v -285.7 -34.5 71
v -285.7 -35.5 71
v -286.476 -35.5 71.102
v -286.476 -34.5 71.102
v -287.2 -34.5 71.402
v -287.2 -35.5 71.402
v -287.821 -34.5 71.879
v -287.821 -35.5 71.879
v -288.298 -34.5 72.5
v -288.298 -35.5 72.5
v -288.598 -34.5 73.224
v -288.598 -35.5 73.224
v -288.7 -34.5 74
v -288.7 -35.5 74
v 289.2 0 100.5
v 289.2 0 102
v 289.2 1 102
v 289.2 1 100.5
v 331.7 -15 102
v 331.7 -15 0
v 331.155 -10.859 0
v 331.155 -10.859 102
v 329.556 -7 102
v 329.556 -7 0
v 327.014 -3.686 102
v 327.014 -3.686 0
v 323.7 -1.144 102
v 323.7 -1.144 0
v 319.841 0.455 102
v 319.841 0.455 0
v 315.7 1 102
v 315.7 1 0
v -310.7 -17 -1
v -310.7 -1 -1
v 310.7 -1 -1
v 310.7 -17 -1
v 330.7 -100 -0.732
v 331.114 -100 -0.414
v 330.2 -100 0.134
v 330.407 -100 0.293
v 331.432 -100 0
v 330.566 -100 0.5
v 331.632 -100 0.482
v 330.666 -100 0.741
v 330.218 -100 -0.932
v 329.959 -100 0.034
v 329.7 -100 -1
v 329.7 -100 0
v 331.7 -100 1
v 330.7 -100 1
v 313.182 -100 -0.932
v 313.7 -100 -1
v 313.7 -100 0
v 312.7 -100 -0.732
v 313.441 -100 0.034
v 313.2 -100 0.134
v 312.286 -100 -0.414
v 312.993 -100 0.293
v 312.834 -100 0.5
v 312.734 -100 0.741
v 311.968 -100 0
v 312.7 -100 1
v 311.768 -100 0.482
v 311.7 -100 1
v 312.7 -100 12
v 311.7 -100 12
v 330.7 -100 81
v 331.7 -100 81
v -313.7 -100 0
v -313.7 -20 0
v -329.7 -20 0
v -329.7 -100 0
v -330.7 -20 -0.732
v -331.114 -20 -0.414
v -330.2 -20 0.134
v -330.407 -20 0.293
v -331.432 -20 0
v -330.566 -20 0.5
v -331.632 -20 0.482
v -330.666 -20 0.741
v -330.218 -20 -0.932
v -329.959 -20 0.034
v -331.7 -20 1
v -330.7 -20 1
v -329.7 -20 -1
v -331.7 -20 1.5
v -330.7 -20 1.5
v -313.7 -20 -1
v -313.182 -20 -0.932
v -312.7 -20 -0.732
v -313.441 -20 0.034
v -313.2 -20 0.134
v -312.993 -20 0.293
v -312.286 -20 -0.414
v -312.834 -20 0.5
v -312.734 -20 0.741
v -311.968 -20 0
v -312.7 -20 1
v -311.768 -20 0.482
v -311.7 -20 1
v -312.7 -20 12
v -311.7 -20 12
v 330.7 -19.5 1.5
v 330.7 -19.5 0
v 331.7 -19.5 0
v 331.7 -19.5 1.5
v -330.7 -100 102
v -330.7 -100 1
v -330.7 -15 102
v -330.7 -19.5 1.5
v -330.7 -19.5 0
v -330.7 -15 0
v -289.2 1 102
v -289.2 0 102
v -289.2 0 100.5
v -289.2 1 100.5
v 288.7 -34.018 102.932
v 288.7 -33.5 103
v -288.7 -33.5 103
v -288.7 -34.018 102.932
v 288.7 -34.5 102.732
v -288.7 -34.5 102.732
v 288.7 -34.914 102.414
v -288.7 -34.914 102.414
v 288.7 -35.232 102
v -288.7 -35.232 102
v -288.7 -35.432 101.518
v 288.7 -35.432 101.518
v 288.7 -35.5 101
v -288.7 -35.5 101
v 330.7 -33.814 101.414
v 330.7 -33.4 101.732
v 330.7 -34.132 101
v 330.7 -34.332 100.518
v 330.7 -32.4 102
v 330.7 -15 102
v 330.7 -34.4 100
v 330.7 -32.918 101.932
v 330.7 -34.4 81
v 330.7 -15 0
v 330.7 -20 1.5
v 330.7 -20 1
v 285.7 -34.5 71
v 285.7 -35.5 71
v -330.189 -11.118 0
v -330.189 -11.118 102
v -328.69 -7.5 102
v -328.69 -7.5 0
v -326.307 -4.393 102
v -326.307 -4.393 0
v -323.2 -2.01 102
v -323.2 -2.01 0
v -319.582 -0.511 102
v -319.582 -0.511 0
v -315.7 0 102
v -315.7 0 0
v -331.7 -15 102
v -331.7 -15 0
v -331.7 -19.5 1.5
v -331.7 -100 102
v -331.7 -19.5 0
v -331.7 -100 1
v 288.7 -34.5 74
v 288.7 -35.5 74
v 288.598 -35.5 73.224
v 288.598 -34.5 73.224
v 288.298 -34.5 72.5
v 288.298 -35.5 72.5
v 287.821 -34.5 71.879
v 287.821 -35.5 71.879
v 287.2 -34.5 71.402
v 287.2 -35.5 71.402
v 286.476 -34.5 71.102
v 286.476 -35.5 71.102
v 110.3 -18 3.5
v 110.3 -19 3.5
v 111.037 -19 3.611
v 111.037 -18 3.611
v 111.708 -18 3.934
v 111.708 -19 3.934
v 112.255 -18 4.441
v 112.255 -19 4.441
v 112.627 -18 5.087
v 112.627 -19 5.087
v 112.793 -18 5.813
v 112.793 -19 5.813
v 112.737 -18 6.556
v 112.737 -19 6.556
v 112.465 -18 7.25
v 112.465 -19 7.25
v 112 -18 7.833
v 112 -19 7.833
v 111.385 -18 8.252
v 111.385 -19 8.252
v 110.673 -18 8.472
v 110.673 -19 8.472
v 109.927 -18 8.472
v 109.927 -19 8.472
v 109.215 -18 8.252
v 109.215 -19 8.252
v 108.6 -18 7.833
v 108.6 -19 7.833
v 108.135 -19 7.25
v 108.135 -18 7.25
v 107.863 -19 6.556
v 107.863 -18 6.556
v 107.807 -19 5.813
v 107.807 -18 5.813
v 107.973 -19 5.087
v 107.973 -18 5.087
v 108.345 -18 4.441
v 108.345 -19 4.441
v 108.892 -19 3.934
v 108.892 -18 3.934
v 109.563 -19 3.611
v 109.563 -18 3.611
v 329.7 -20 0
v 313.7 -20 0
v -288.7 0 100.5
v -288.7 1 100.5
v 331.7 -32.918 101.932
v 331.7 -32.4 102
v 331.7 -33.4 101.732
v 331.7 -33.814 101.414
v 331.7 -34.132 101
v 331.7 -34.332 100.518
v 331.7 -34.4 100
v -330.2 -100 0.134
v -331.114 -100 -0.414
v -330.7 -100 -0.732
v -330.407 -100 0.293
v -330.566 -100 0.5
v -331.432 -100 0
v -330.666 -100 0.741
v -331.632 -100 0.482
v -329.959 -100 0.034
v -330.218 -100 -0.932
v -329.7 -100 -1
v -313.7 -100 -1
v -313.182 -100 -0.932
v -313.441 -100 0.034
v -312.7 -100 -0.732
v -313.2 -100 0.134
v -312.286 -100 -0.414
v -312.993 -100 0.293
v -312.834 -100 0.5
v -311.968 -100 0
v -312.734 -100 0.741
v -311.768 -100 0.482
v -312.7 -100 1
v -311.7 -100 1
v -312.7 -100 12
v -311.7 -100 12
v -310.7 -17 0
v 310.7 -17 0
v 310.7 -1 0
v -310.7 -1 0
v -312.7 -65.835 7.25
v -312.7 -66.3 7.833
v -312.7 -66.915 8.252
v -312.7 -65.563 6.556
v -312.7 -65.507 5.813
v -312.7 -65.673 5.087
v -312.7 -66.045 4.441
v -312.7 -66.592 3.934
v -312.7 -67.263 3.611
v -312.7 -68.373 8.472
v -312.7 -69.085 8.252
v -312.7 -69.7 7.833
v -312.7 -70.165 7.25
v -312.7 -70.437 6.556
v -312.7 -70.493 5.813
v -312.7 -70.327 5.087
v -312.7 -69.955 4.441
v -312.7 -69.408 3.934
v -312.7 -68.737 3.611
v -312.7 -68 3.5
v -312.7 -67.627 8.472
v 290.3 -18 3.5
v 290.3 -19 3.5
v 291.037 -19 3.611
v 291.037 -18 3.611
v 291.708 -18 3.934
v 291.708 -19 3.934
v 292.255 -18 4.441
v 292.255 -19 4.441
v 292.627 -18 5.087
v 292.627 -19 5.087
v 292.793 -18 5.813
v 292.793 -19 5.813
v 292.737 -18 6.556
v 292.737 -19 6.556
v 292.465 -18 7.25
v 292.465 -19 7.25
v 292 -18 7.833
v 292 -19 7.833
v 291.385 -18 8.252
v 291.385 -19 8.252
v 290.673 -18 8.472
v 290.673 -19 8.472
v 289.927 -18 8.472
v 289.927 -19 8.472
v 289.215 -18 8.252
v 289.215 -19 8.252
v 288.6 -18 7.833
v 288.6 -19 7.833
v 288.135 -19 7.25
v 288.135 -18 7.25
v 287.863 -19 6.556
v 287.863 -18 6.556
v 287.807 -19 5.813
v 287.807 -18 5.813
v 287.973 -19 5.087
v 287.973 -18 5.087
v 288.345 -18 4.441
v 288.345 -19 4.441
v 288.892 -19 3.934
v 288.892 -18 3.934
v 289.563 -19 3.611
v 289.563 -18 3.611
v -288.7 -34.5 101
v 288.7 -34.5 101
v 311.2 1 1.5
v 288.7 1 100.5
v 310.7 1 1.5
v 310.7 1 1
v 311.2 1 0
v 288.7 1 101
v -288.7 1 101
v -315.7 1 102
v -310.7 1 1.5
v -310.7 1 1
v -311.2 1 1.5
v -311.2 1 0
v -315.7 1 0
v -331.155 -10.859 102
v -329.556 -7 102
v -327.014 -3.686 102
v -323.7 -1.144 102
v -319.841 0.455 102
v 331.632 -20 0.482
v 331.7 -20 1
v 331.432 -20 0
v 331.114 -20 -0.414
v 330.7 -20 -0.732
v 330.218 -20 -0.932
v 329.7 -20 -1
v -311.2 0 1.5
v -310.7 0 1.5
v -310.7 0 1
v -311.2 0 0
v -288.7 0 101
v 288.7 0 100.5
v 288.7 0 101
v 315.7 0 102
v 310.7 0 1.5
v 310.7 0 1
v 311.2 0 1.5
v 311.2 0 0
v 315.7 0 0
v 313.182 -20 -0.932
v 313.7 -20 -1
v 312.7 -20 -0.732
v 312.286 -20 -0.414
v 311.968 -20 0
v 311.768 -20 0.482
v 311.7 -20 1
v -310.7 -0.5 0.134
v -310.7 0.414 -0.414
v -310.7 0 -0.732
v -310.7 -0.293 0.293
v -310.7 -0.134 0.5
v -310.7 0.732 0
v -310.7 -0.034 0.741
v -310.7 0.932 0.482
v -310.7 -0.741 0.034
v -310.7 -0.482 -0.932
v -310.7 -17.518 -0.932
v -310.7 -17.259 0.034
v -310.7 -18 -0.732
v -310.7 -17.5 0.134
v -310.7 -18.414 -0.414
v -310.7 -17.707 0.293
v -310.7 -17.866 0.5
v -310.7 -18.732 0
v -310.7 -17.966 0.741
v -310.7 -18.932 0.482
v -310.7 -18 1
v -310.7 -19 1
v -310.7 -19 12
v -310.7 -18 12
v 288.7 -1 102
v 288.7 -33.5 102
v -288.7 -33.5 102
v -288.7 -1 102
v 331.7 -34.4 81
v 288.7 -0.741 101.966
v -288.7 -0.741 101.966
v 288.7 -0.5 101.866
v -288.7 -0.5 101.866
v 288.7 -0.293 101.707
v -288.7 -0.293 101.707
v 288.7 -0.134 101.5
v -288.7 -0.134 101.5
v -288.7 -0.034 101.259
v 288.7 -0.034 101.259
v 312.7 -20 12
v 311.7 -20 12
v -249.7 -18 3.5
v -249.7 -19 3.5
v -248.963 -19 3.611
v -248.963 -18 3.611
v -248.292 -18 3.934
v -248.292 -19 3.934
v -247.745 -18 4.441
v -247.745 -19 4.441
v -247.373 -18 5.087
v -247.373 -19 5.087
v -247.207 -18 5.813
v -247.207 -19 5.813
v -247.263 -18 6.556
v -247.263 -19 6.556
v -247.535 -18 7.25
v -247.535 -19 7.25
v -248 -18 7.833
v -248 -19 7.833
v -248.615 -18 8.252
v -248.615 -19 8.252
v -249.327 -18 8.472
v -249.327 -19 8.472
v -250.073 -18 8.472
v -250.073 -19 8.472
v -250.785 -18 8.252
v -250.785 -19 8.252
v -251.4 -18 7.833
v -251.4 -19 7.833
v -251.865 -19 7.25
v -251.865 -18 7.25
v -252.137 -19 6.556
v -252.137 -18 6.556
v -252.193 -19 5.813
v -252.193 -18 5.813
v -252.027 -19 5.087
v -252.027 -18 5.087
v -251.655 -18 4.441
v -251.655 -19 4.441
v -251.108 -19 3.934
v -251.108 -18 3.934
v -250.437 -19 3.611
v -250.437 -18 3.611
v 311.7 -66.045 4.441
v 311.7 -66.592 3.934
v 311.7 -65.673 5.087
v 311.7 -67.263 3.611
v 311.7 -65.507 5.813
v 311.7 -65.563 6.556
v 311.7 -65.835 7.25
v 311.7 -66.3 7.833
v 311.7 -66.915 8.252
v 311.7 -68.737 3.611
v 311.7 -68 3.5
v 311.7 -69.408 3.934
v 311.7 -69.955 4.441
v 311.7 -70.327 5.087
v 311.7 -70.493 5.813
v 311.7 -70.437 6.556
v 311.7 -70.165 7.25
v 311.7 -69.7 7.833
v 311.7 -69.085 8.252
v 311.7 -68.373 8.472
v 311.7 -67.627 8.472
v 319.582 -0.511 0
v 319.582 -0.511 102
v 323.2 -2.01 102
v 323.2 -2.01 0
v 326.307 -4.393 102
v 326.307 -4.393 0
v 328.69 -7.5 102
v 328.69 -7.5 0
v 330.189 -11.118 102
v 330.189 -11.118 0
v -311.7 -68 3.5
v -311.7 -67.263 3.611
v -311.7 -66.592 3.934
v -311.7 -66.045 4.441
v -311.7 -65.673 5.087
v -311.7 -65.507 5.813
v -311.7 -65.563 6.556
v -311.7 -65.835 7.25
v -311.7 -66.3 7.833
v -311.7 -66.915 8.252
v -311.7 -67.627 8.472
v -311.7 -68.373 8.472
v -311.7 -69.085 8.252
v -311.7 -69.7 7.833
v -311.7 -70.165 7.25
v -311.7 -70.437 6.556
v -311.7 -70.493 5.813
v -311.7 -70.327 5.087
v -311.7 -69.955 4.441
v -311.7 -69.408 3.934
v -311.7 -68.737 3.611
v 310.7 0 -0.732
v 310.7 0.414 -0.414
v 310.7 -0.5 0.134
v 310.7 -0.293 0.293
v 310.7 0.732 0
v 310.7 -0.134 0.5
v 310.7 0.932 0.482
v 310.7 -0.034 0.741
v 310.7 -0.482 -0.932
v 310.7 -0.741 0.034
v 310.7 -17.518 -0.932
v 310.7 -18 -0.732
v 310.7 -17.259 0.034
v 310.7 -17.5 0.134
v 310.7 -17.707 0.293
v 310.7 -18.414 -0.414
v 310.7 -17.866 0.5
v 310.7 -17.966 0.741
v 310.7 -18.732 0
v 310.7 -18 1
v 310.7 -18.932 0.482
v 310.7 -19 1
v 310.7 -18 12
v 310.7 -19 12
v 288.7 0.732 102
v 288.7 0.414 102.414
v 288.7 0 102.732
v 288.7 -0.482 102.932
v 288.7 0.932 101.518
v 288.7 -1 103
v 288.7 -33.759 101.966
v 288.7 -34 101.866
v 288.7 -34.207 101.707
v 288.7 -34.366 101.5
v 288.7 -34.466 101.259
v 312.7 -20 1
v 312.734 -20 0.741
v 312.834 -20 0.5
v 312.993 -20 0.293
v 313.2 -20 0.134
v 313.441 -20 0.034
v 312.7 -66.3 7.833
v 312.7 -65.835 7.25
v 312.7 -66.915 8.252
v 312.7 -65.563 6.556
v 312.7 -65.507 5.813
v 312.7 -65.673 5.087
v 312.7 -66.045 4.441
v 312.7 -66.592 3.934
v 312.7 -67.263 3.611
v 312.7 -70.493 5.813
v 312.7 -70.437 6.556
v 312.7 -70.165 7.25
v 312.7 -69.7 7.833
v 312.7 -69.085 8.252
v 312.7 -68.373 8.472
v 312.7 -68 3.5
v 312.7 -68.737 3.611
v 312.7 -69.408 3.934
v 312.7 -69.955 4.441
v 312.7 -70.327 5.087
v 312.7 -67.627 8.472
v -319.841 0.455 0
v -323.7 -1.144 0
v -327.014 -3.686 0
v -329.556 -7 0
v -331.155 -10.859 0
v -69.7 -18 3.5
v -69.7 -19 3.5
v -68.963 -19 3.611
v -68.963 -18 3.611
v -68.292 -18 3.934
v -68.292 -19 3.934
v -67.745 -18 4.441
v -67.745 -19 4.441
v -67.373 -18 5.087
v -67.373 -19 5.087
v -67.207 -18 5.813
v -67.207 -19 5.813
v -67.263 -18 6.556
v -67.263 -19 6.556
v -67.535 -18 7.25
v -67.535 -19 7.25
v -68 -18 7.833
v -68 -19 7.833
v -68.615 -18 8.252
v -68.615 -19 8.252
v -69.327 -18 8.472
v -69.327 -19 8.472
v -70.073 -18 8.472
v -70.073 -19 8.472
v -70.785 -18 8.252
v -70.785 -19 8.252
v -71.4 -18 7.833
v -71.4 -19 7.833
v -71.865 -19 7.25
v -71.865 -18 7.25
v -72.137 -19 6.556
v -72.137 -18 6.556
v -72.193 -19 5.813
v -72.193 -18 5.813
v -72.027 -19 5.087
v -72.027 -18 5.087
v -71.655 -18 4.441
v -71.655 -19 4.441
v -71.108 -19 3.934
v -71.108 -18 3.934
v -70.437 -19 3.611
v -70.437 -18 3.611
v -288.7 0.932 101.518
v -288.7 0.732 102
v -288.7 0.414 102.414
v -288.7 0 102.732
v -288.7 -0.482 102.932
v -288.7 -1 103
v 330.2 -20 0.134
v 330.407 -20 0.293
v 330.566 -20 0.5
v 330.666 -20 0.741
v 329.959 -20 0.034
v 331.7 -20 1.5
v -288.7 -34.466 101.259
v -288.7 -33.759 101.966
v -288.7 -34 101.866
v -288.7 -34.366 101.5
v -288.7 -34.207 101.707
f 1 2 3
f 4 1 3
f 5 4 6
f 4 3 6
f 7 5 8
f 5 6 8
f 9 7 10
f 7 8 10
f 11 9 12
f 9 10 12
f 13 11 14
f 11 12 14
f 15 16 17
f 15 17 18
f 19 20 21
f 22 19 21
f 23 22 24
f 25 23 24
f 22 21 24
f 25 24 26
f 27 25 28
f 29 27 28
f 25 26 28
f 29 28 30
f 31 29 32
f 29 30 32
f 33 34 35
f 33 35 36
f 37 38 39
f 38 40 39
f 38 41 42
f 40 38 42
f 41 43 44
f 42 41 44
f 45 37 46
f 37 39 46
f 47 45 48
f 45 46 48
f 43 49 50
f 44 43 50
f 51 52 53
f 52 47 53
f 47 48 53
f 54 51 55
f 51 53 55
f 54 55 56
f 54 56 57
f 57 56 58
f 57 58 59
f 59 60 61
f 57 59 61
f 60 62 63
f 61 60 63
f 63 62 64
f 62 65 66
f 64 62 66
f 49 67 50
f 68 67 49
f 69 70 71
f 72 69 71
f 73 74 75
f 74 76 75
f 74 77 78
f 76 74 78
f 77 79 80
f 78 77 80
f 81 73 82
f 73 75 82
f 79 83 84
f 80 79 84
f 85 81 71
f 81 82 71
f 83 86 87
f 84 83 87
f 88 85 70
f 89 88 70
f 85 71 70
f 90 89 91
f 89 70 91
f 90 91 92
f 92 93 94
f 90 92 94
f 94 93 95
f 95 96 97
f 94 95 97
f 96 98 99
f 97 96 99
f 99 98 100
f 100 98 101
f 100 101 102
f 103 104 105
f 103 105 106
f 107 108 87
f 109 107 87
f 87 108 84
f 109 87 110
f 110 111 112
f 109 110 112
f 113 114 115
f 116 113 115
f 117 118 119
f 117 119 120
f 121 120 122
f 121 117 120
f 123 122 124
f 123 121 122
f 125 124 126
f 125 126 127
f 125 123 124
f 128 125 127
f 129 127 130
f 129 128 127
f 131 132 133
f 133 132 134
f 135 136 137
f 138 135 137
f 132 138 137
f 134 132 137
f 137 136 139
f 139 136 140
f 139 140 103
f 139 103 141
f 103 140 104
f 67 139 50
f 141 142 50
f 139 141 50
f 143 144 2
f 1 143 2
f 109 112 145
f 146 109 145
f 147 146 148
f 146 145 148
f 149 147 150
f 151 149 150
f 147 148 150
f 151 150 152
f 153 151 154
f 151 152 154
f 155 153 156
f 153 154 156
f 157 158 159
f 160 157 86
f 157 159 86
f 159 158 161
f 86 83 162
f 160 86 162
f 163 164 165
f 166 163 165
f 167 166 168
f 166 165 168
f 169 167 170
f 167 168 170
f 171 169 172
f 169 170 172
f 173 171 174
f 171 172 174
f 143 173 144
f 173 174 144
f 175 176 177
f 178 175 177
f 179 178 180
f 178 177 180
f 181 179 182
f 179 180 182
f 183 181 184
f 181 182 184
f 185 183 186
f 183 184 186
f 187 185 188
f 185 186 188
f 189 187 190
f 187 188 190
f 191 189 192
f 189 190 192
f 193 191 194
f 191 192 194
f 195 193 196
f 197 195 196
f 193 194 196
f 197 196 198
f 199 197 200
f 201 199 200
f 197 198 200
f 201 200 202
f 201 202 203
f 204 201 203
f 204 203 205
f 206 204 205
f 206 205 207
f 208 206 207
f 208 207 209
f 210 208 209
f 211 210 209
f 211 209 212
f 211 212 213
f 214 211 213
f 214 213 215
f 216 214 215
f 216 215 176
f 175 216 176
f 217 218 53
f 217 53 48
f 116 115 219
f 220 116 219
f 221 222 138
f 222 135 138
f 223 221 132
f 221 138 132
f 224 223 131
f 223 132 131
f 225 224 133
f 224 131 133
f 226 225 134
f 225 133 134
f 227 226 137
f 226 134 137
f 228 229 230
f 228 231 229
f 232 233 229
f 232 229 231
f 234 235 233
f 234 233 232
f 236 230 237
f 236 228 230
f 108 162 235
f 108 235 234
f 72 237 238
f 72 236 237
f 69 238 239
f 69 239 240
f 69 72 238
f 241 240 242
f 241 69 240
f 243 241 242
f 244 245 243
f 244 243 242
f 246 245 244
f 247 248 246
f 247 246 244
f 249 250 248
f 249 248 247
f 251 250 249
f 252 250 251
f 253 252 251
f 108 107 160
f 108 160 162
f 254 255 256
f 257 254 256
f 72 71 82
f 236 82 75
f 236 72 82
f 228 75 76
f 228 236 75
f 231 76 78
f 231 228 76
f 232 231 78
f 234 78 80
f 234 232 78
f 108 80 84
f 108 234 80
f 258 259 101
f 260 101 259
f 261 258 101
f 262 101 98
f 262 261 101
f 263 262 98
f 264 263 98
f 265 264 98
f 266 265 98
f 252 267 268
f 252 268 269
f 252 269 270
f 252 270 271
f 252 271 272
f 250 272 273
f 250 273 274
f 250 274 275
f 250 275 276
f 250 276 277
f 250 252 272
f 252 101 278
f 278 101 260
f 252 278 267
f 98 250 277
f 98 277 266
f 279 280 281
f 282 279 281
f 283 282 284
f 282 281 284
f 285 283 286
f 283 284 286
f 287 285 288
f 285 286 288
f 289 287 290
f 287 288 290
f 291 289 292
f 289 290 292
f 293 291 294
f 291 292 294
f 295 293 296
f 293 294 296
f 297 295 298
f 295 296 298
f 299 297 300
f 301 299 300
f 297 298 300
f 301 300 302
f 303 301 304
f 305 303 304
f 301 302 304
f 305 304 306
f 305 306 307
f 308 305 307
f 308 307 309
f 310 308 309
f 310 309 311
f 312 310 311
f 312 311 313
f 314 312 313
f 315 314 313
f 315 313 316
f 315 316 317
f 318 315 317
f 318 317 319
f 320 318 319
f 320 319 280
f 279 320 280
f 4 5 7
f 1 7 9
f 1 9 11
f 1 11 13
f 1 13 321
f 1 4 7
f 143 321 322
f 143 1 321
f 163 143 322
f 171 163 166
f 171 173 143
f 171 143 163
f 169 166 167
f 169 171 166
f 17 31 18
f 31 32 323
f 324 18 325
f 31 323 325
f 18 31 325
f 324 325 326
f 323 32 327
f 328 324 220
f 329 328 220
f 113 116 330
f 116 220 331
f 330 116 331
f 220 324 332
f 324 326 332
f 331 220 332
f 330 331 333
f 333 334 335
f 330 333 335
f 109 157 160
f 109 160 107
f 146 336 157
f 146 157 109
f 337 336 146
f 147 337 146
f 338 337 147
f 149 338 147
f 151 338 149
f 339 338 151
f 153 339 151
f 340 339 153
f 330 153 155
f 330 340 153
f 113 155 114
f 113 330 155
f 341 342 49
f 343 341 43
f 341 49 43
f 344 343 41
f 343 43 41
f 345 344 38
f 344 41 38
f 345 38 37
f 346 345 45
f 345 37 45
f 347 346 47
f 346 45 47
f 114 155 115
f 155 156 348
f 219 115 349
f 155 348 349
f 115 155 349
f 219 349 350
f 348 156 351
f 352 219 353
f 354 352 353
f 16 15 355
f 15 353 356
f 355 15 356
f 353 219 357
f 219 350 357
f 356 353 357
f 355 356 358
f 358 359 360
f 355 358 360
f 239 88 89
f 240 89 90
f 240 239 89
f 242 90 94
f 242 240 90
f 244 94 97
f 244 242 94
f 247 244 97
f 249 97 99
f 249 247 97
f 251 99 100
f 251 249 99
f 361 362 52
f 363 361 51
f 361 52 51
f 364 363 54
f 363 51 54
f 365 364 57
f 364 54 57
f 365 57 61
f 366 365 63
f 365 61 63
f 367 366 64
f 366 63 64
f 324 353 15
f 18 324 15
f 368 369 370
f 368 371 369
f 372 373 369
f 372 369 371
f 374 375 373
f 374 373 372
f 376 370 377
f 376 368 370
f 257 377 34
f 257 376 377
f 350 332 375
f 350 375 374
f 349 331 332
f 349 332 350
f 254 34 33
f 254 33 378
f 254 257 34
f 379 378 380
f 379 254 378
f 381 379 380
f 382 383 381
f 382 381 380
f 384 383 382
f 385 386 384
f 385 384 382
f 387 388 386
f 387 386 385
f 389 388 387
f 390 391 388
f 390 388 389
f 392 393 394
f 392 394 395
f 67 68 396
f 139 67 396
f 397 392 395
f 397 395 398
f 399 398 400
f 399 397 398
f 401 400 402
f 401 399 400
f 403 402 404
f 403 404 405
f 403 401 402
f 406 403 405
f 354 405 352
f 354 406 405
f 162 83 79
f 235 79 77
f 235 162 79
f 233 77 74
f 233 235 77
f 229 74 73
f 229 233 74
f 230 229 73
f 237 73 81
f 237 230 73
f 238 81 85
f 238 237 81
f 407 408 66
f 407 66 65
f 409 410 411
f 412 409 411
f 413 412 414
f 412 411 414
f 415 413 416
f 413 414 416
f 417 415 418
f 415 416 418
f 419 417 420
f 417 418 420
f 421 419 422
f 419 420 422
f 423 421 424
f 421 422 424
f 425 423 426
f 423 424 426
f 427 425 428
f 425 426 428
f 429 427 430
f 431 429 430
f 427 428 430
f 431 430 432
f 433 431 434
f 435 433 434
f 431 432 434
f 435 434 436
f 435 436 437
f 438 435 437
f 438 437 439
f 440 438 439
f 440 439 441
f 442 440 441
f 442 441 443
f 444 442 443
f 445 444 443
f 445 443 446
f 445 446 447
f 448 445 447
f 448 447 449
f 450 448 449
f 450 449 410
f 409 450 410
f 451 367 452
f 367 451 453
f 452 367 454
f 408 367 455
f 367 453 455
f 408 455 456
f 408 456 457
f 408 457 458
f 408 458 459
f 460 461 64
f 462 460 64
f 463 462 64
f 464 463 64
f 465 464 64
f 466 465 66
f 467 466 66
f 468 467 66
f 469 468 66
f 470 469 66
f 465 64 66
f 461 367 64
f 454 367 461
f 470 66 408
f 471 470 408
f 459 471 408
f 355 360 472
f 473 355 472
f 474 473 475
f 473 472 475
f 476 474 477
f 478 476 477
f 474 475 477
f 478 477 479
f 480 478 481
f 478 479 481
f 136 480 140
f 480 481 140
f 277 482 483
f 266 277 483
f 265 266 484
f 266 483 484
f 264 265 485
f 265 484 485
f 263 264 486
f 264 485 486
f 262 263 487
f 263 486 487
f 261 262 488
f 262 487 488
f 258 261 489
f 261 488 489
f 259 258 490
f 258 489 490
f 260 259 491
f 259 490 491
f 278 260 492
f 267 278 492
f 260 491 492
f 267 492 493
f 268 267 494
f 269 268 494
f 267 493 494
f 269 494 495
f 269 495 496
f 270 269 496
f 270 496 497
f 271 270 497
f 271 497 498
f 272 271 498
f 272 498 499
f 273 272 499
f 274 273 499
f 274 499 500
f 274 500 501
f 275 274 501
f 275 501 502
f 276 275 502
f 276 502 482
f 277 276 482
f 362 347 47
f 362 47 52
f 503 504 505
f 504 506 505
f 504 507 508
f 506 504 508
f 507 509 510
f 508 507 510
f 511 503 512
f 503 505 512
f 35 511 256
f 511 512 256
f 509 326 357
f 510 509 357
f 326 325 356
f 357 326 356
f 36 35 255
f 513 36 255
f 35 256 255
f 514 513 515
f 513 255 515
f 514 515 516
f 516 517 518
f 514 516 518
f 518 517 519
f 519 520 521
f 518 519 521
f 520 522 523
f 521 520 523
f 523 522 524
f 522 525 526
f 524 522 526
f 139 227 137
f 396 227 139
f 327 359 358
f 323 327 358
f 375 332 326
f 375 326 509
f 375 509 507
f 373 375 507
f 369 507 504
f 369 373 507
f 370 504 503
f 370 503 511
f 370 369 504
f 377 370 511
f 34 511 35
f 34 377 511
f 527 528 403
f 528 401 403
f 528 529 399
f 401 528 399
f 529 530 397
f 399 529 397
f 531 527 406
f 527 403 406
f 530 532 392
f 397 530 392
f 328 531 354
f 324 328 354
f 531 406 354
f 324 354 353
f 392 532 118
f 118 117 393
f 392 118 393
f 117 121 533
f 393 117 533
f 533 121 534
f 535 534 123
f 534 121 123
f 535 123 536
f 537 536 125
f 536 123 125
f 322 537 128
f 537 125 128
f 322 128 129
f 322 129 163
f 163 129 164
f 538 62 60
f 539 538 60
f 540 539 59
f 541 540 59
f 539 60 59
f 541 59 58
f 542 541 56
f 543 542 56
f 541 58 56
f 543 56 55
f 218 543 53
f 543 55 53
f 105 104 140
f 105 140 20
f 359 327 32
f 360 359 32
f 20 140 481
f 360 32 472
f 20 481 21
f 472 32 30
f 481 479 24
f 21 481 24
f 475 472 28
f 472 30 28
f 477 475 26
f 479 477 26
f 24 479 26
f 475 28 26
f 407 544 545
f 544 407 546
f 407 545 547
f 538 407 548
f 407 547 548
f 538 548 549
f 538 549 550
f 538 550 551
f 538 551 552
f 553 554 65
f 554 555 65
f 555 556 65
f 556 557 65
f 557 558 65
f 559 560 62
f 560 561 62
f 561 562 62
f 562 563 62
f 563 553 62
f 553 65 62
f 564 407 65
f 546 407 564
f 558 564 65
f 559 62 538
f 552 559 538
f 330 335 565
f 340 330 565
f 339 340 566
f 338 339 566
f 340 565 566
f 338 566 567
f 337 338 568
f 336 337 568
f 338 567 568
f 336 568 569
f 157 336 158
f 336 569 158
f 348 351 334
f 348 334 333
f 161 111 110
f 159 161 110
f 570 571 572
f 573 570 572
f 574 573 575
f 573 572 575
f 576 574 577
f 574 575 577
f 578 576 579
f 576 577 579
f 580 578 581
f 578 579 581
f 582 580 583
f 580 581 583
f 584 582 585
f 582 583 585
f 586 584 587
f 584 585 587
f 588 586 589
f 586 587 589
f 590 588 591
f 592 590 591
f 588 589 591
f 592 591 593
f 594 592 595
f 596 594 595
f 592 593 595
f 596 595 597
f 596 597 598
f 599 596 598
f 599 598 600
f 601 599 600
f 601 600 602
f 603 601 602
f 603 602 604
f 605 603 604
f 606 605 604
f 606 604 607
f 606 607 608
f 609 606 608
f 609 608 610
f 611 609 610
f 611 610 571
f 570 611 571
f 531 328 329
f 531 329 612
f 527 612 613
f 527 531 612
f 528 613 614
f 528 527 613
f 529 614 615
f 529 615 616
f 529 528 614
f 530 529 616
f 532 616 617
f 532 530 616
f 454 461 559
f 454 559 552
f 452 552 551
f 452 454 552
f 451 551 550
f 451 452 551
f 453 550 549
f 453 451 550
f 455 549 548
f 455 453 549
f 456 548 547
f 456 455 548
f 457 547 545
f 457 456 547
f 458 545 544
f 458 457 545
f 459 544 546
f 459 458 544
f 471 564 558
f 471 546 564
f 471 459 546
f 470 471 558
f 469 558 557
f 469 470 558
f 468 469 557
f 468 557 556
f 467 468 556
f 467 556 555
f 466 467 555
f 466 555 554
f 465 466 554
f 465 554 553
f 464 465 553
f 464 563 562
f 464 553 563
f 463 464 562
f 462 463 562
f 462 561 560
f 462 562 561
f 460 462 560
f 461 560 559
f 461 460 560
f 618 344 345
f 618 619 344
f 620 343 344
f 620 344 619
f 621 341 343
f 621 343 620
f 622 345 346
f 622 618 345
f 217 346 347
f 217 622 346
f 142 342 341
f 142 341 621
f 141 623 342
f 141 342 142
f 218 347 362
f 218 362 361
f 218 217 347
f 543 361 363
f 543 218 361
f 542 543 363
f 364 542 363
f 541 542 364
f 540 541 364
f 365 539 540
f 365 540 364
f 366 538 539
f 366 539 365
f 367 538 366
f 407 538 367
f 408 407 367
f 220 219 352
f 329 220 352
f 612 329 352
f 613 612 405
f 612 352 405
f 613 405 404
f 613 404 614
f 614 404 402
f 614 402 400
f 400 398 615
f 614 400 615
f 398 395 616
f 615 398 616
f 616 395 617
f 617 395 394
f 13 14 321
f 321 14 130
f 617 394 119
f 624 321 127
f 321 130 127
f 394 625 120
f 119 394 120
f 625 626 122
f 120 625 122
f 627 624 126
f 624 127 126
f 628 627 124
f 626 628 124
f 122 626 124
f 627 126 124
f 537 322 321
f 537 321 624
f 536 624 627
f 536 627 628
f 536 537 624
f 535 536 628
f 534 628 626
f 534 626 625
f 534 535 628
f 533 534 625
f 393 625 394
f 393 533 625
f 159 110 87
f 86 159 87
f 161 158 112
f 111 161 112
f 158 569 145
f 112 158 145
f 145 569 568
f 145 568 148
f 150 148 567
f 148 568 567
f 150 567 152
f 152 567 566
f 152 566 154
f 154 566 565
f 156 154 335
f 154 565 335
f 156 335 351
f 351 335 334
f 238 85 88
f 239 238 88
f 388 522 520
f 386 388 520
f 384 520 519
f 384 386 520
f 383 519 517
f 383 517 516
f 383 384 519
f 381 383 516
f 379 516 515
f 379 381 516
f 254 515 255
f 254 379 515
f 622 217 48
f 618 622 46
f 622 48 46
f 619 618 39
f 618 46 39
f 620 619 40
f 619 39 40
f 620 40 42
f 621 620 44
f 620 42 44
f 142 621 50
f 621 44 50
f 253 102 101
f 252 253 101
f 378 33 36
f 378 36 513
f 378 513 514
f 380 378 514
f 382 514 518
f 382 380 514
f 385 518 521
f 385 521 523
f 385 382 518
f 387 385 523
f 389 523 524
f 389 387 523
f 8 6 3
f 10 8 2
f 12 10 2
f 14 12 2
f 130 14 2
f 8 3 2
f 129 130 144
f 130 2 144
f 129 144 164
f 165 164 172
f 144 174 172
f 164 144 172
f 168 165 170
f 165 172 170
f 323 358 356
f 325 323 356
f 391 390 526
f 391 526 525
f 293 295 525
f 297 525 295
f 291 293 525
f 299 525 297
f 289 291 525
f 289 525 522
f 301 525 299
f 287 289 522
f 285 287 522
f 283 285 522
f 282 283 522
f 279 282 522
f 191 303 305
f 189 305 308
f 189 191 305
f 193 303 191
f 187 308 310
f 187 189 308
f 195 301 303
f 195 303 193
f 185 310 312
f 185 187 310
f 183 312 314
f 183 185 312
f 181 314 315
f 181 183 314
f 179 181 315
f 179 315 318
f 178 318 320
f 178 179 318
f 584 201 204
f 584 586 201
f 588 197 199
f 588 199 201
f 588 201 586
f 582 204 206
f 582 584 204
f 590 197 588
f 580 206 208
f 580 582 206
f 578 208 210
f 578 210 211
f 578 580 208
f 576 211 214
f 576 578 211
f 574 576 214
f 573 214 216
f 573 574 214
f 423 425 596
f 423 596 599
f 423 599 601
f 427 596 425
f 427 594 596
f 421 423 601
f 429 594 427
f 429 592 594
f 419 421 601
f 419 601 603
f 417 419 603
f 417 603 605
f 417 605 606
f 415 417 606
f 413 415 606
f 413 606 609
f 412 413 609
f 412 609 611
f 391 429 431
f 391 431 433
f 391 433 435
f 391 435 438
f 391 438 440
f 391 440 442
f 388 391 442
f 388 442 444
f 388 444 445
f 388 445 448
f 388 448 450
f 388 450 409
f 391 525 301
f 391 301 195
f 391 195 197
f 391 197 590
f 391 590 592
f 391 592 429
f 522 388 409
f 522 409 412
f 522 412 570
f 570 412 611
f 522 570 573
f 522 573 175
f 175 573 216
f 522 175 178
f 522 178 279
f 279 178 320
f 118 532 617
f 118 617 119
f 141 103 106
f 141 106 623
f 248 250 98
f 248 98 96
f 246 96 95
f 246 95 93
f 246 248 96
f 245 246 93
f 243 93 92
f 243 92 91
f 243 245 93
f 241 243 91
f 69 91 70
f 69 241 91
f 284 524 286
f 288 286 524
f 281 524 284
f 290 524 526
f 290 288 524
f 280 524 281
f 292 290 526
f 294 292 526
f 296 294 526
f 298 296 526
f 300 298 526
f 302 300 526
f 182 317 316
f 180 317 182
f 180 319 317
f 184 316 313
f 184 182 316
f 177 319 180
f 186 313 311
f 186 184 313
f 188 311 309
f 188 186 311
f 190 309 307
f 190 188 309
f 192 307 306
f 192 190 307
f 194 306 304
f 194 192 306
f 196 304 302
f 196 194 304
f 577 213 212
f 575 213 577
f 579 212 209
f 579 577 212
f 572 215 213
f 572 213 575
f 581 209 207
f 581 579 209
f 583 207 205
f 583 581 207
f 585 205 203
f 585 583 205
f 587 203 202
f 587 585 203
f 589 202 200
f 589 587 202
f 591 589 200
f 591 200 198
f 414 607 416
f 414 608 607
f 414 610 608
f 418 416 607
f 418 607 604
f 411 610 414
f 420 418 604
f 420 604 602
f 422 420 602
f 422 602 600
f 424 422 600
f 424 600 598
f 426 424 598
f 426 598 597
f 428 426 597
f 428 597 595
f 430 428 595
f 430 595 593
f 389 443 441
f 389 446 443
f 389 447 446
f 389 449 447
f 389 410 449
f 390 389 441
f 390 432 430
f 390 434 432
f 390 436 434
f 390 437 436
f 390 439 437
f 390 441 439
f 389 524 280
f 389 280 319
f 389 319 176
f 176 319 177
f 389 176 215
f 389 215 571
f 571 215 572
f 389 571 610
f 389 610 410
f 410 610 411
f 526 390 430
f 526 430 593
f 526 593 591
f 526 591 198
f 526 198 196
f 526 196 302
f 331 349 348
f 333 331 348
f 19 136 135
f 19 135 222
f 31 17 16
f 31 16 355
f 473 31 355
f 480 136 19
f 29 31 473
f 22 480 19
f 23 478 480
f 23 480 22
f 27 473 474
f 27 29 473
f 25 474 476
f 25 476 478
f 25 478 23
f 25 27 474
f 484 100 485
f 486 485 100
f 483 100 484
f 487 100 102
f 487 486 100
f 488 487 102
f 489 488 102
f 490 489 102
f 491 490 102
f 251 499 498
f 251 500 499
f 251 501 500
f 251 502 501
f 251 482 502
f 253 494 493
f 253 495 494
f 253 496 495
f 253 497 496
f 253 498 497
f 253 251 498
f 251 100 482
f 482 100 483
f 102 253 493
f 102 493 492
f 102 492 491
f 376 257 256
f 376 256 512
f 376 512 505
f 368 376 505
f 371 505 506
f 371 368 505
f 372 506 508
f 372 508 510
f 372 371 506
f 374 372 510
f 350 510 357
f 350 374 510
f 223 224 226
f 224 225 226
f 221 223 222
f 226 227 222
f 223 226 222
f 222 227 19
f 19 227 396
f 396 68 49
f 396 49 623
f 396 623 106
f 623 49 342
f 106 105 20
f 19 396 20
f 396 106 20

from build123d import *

# Parameters (mm, degrees)
BASE_FLANGE1_DEPTH             = 102
EDGE_FLANGE1_STRIP_W           = 6
EDGE_FLANGE1_STRIP_H           = 1
EDGE_FLANGE1_STRIP_CUT_DEPTH   = 621.4
EDGE_FLANGE1_RELIEF_W          = 6.5
EDGE_FLANGE1_RELIEF_H          = 0.5
EDGE_FLANGE1_RELIEF_CUT_DEPTH  = 1
EDGE_FLANGE1_DEPTH             = 621.4
EDGE_FLANGE2_STRIP_W           = 6
EDGE_FLANGE2_STRIP_H           = 1
EDGE_FLANGE2_STRIP_CUT_DEPTH   = 621.4
EDGE_FLANGE2_DEPTH             = 621.4
EDGE_FLANGE3_STRIP_W           = 6
EDGE_FLANGE3_STRIP_H           = 1
EDGE_FLANGE3_STRIP_CUT_DEPTH   = 80
EDGE_FLANGE3_RELIEF_W          = 6.5
EDGE_FLANGE3_RELIEF_H          = 0.5
EDGE_FLANGE3_RELIEF_CUT_DEPTH  = 1
EDGE_FLANGE3_DEPTH             = 80
EDGE_FLANGE4_STRIP_W           = 6
EDGE_FLANGE4_STRIP_H           = 1
EDGE_FLANGE4_STRIP_CUT_DEPTH   = 80
EDGE_FLANGE4_DEPTH             = 80
EDGE_FLANGE5_STRIP_W           = 6
EDGE_FLANGE5_STRIP_H           = 1
EDGE_FLANGE5_STRIP_CUT_DEPTH   = 577.4
EDGE_FLANGE5_RELIEF_W          = 6.5
EDGE_FLANGE5_RELIEF_H          = 0.5
EDGE_FLANGE5_RELIEF_CUT_DEPTH  = 1
EDGE_FLANGE5_DEPTH             = 577.4
SKETCH25_R                     = 2.5
CUT_EXTRUDE1_DEPTH             = 3
SKETCH26_R                     = 2.5
CUT_EXTRUDE2_DEPTH             = 3
CUT_EXTRUDE2_DIRECTION_2_REACH = 661.221
EDGE_FLANGE7_STRIP_W           = 6
EDGE_FLANGE7_STRIP_H           = 1
EDGE_FLANGE7_STRIP_CUT_DEPTH   = 577.4
EDGE_FLANGE7_DEPTH             = 577.4
EDGE_FLANGE7_FLAT_DEPTH        = 1
SKETCH30_W                     = 21
SKETCH30_H                     = 65.6
CUT_EXTRUDE3_DEPTH             = 10
FILLET1_R                      = 2


# Sheet-metal steps are written as plain solids
with BuildPart() as part:
    # Sketch1 → Base-Flange1 (new body)
    with BuildSketch(Plane.XY):
        with BuildLine():
            Line((-330.7, -100), (-330.7, -15))
            ThreePointArc((-330.7, -15), (-326.306601718, -4.393398282), (-315.7, 0))
            Line((-315.7, 0), (315.7, 0))
            ThreePointArc((315.7, 0), (326.306601718, -4.393398282), (330.7, -15))
            Line((330.7, -15), (330.7, -100))
            Line((330.7, -100), (331.7, -100))
            Line((331.7, -100), (331.7, -15))
            ThreePointArc((331.7, -15), (327.013708499, -3.686291501), (315.7, 1))
            Line((315.7, 1), (-315.7, 1))
            ThreePointArc((-315.7, 1), (-327.013708499, -3.686291501), (-331.7, -15))
            Line((-331.7, -15), (-331.7, -100))
            Line((-331.7, -100), (-330.7, -100))
        make_face()
    extrude(amount=BASE_FLANGE1_DEPTH)

    # Edge-Flange1 strip (across the edge) → Edge-Flange1 strip cut (cut)
    with BuildSketch(Plane(origin=(-310.7, 0, 0), x_dir=(0, 0, 1), z_dir=(1, 0, 0))):
        with Locations((-2, -0.5)):
            Rectangle(EDGE_FLANGE1_STRIP_W, EDGE_FLANGE1_STRIP_H)
    extrude(amount=EDGE_FLANGE1_STRIP_CUT_DEPTH, mode=Mode.SUBTRACT)

    # Edge-Flange1 relief (on the sheet) → Edge-Flange1 relief cut (cut)
    with BuildSketch(Plane(origin=(-310.7, 0, 1), x_dir=(0, 0, 1), z_dir=(0, -1, 0))):
        with Locations((-2.75, 0.25)):
            Rectangle(EDGE_FLANGE1_RELIEF_W, EDGE_FLANGE1_RELIEF_H)
        with Locations((-2.75, -621.65)):
            Rectangle(EDGE_FLANGE1_RELIEF_W, EDGE_FLANGE1_RELIEF_H)
    extrude(amount=-EDGE_FLANGE1_RELIEF_CUT_DEPTH, mode=Mode.SUBTRACT)

    # Edge-Flange1 section (across the edge) → Edge-Flange1 (add)
    with BuildSketch(Plane(origin=(-310.7, 0, 0), x_dir=(0, 0, 1), z_dir=(1, 0, 0))):
        with BuildLine():
            Line((-1, 1), (-1, 19))
            Line((-1, 19), (0, 19))
            Line((0, 19), (0, 1))
            ThreePointArc((0, 1), (0.292893219, 0.292893219), (1, 0))
            Line((1, 0), (1, -1))
            ThreePointArc((1, -1), (-0.414213562, -0.414213562), (-1, 1))
        make_face()
    extrude(amount=EDGE_FLANGE1_DEPTH)

    # Edge-Flange2 strip (across the edge) → Edge-Flange2 strip cut (cut)
    with BuildSketch(Plane(origin=(-310.7, -19, 0), x_dir=(0, 1, 0), z_dir=(1, 0, 0))):
        with Locations((-1, -0.5)):
            Rectangle(EDGE_FLANGE2_STRIP_W, EDGE_FLANGE2_STRIP_H)
    extrude(amount=EDGE_FLANGE2_STRIP_CUT_DEPTH, mode=Mode.SUBTRACT)

    # Edge-Flange2 section (across the edge) → Edge-Flange2 (add)
    with BuildSketch(Plane(origin=(-310.7, -19, 0), x_dir=(0, 1, 0), z_dir=(1, 0, 0))):
        with BuildLine():
            Line((0, 1), (0, 12))
            Line((0, 12), (1, 12))
            Line((1, 12), (1, 1))
            ThreePointArc((1, 1), (1.292893219, 0.292893219), (2, 0))
            Line((2, 0), (2, -1))
            ThreePointArc((2, -1), (0.585786438, -0.414213562), (0, 1))
        make_face()
    extrude(amount=EDGE_FLANGE2_DEPTH)

    # Edge-Flange3 strip (across the edge) → Edge-Flange3 strip cut (cut)
    with BuildSketch(Plane(origin=(-330.7, -100, 0), x_dir=(0, 0, 1), z_dir=(0, 1, 0))):
        with Locations((-2, -0.5)):
            Rectangle(EDGE_FLANGE3_STRIP_W, EDGE_FLANGE3_STRIP_H)
    edge_flange3_strip_cut = extrude(amount=EDGE_FLANGE3_STRIP_CUT_DEPTH, mode=Mode.SUBTRACT)

    # Edge-Flange3 relief (on the sheet) → Edge-Flange3 relief cut (cut)
    with BuildSketch(Plane(origin=(-330.7, -100, 1), x_dir=(0, 0, 1), z_dir=(1, 0, 0))):
        with Locations((-2.75, -80.25)):
            Rectangle(EDGE_FLANGE3_RELIEF_W, EDGE_FLANGE3_RELIEF_H)
    edge_flange3_relief_cut = extrude(amount=-EDGE_FLANGE3_RELIEF_CUT_DEPTH, mode=Mode.SUBTRACT)

    # Edge-Flange3 section (across the edge) → Edge-Flange3 (add)
    with BuildSketch(Plane(origin=(-330.7, -100, 0), x_dir=(0, 0, 1), z_dir=(0, 1, 0))):
        with BuildLine():
            Line((-1, 1), (-1, 19))
            Line((-1, 19), (0, 19))
            Line((0, 19), (0, 1))
            ThreePointArc((0, 1), (0.292893219, 0.292893219), (1, 0))
            Line((1, 0), (1, -1))
            ThreePointArc((1, -1), (-0.414213562, -0.414213562), (-1, 1))
        make_face()
    edge_flange3 = extrude(amount=EDGE_FLANGE3_DEPTH)

    # Edge-Flange4 strip (across the edge) → Edge-Flange4 strip cut (cut)
    with BuildSketch(Plane(origin=(-311.7, -100, 0), x_dir=(-1, 0, 0), z_dir=(0, 1, 0))):
        with Locations((-1, -0.5)):
            Rectangle(EDGE_FLANGE4_STRIP_W, EDGE_FLANGE4_STRIP_H)
    edge_flange4_strip_cut = extrude(amount=EDGE_FLANGE4_STRIP_CUT_DEPTH, mode=Mode.SUBTRACT)

    # Edge-Flange4 section (across the edge) → Edge-Flange4 (add)
    with BuildSketch(Plane(origin=(-311.7, -100, 0), x_dir=(-1, 0, 0), z_dir=(0, 1, 0))):
        with BuildLine():
            Line((0, 1), (0, 12))
            Line((0, 12), (1, 12))
            Line((1, 12), (1, 1))
            ThreePointArc((1, 1), (1.292893219, 0.292893219), (2, 0))
            Line((2, 0), (2, -1))
            ThreePointArc((2, -1), (0.585786438, -0.414213562), (0, 1))
        make_face()
    edge_flange4 = extrude(amount=EDGE_FLANGE4_DEPTH)

    # Mirror1: Edge-Flange3 strip cut, Edge-Flange3 relief cut, Edge-Flange3, Edge-Flange4 strip cut, Edge-Flange4 across plane
    add(edge_flange3_strip_cut.mirror(Plane(origin=(0, 0, 0), x_dir=(0, 0, 1), z_dir=(1, 0, 0))), mode=Mode.SUBTRACT)
    add(edge_flange3_relief_cut.mirror(Plane(origin=(0, 0, 0), x_dir=(0, 0, 1), z_dir=(1, 0, 0))), mode=Mode.SUBTRACT)
    add(edge_flange3.mirror(Plane(origin=(0, 0, 0), x_dir=(0, 0, 1), z_dir=(1, 0, 0))))
    add(edge_flange4_strip_cut.mirror(Plane(origin=(0, 0, 0), x_dir=(0, 0, 1), z_dir=(1, 0, 0))), mode=Mode.SUBTRACT)
    add(edge_flange4.mirror(Plane(origin=(0, 0, 0), x_dir=(0, 0, 1), z_dir=(1, 0, 0))))

    # Edge-Flange5 strip (across the edge) → Edge-Flange5 strip cut (cut)
    with BuildSketch(Plane(origin=(288.7, 0, 102), x_dir=(0, 0, -1), z_dir=(-1, 0, 0))):
        with Locations((-2, -0.5)):
            Rectangle(EDGE_FLANGE5_STRIP_W, EDGE_FLANGE5_STRIP_H)
    extrude(amount=EDGE_FLANGE5_STRIP_CUT_DEPTH, mode=Mode.SUBTRACT)

    # Edge-Flange5 relief (on the sheet) → Edge-Flange5 relief cut (cut)
    with BuildSketch(Plane(origin=(288.7, 0, 101), x_dir=(0, 0, -1), z_dir=(0, -1, 0))):
        with Locations((-2.75, 0.25)):
            Rectangle(EDGE_FLANGE5_RELIEF_W, EDGE_FLANGE5_RELIEF_H)
        with Locations((-2.75, -577.65)):
            Rectangle(EDGE_FLANGE5_RELIEF_W, EDGE_FLANGE5_RELIEF_H)
    extrude(amount=-EDGE_FLANGE5_RELIEF_CUT_DEPTH, mode=Mode.SUBTRACT)

    # Edge-Flange5 section (across the edge) → Edge-Flange5 (add)
    with BuildSketch(Plane(origin=(288.7, 0, 102), x_dir=(0, 0, -1), z_dir=(-1, 0, 0))):
        with BuildLine():
            Line((-1, 1), (-1, 35.5))
            Line((-1, 35.5), (0, 35.5))
            Line((0, 35.5), (0, 1))
            ThreePointArc((0, 1), (0.292893219, 0.292893219), (1, 0))
            Line((1, 0), (1, -1))
            ThreePointArc((1, -1), (-0.414213562, -0.414213562), (-1, 1))
        make_face()
    extrude(amount=EDGE_FLANGE5_DEPTH)

    # Sketch25 → Cut-Extrude1 (cut)
    with BuildSketch(Plane.XZ.offset(19)):
        with Locations(Location((-249.7, 6, 0), (0, 0, 270))):
            Circle(SKETCH25_R)
        with Locations(Location((-69.7, 6, 0), (0, 0, 270))):
            Circle(SKETCH25_R)
        with Locations(Location((110.3, 6, 0), (0, 0, 270))):
            Circle(SKETCH25_R)
        with Locations(Location((290.3, 6, 0), (0, 0, 270))):
            Circle(SKETCH25_R)
        with Locations((470.3, 6)):
            Circle(SKETCH25_R)
        with Locations((650.3, 6)):
            Circle(SKETCH25_R)
        with Locations((830.3, 6)):
            Circle(SKETCH25_R)
    extrude(amount=-CUT_EXTRUDE1_DEPTH, mode=Mode.SUBTRACT)

    # Sketch26 → Cut-Extrude2 (cut)
    with BuildSketch(Plane(origin=(-311.7, 0, 0), x_dir=(0, 0, -1), z_dir=(1, 0, 0))):
        with Locations((-6, -68)):
            Circle(SKETCH26_R)
    extrude(amount=-CUT_EXTRUDE2_DEPTH, mode=Mode.SUBTRACT)

    # Cut-Extrude2 direction 2: up to this face of the body (flat: up to its plane)
    cut_extrude2_direction_2_end = Plane(part.part.faces().sort_by_distance((312.7, -60, 6.5))[0])
    # Sketch26 → Cut-Extrude2 direction 2 (cut, up to the picked face)
    with BuildSketch(Plane(origin=(-311.7, 0, 0), x_dir=(0, 0, -1), z_dir=(1, 0, 0)), mode=Mode.PRIVATE) as cut_extrude2_direction_2_sk1:
        with Locations((-6, -68)):
            Circle(SKETCH26_R)
    cut_extrude2_direction_2_tool1 = split(extrude(cut_extrude2_direction_2_sk1.sketch, amount=CUT_EXTRUDE2_DIRECTION_2_REACH, mode=Mode.PRIVATE), bisect_by=cut_extrude2_direction_2_end, keep=Keep.BOTH, mode=Mode.PRIVATE)
    add(cut_extrude2_direction_2_tool1.solids().sort_by(Axis((-311.7, -68, 6), (1, 0, 0)))[0], mode=Mode.SUBTRACT)

    # Edge-Flange7 strip (across the edge) → Edge-Flange7 strip cut (cut)
    with BuildSketch(Plane(origin=(288.7, -35.5, 102), x_dir=(0, 1, 0), z_dir=(-1, 0, 0))):
        with Locations((-1, -0.5)):
            Rectangle(EDGE_FLANGE7_STRIP_W, EDGE_FLANGE7_STRIP_H)
    extrude(amount=EDGE_FLANGE7_STRIP_CUT_DEPTH, mode=Mode.SUBTRACT)

    # Edge-Flange7 bend section (across the edge) → Edge-Flange7 (add)
    with BuildSketch(Plane(origin=(288.7, -35.5, 102), x_dir=(0, 1, 0), z_dir=(-1, 0, 0))):
        with BuildLine():
            Line((0, 1), (1, 1))
            ThreePointArc((1, 1), (1.292893219, 0.292893219), (2, 0))
            Line((2, 0), (2, -1))
            ThreePointArc((2, -1), (0.585786438, -0.414213562), (0, 1))
        make_face()
    extrude(amount=EDGE_FLANGE7_DEPTH)

    # Edge-Flange7 profile (on flange) → Edge-Flange7 flat (add)
    with BuildSketch(Plane(origin=(0, -35.5, 102), x_dir=(1, 0, 0), z_dir=(0, 1, 0))):
        with BuildLine():
            Line((-288.7, 1), (288.7, 1))
            Line((288.7, 1), (288.7, 28))
            ThreePointArc((288.7, 28), (287.821320344, 30.121320344), (285.7, 31))
            Line((285.7, 31), (-285.7, 31))
            ThreePointArc((-285.7, 31), (-287.821320344, 30.121320344), (-288.7, 28))
            Line((-288.7, 28), (-288.7, 1))
        make_face()
    extrude(amount=EDGE_FLANGE7_FLAT_DEPTH)

    # Sketch30 → Cut-Extrude3 (cut)
    with BuildSketch(Plane(origin=(331.7, 0, 0), x_dir=(0, 0, -1), z_dir=(1, 0, 0))):
        with Locations((-91.5, -67.2)):
            Rectangle(SKETCH30_W, SKETCH30_H)
    extrude(amount=-CUT_EXTRUDE3_DEPTH, mode=Mode.SUBTRACT)

    # Fillet1
    fillet1_edges = [part.edges().sort_by_distance(p)[0] for p in [
        (331.2, -34.4, 102),
    ]]
    fillet(fillet1_edges, radius=FILLET1_R)


solid = part.part
